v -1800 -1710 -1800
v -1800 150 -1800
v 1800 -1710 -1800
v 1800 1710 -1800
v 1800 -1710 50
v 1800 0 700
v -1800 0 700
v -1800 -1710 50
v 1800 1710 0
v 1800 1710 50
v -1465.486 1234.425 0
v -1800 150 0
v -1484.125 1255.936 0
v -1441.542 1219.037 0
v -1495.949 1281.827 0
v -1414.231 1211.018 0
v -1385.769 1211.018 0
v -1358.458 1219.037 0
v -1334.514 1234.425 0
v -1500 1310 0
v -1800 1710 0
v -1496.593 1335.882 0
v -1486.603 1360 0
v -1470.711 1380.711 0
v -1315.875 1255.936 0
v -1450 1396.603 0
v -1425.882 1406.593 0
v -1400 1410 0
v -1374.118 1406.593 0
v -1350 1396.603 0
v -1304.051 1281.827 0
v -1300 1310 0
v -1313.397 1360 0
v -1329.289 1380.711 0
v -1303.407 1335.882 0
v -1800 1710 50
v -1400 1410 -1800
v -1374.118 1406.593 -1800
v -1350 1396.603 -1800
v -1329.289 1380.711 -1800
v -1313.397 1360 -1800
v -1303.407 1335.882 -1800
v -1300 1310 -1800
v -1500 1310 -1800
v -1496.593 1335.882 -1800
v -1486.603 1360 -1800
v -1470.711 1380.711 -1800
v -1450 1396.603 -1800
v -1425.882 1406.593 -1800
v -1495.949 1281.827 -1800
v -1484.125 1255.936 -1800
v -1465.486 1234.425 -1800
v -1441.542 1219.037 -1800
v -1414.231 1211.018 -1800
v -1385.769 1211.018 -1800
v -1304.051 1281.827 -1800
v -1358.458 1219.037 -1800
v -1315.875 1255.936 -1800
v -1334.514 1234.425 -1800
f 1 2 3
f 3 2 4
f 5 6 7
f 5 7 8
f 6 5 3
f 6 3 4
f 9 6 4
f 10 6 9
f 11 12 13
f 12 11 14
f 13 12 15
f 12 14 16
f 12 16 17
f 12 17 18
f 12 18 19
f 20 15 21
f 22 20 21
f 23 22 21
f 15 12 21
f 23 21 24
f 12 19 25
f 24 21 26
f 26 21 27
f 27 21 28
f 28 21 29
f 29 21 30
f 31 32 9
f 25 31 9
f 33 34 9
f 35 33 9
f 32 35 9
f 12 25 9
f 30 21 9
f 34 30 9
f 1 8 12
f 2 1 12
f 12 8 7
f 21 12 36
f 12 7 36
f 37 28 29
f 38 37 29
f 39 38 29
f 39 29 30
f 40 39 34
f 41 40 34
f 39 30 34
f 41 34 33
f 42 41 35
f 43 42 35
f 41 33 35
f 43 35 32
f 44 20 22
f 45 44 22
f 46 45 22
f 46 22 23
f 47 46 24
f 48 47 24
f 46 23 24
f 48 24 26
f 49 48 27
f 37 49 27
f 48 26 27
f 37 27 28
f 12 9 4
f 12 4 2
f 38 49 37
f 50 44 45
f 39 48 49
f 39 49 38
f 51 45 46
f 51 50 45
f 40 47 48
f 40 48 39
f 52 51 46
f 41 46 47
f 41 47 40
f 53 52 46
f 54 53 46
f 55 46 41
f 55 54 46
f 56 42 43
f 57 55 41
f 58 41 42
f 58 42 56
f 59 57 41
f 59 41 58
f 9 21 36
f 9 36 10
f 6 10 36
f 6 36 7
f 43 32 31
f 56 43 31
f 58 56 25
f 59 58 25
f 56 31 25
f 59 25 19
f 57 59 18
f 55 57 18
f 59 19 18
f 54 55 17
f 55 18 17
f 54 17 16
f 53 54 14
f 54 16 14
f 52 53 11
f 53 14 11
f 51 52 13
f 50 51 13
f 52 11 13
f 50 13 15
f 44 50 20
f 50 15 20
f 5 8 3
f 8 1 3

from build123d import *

# Parameters (mm, degrees)
F1_DEPTH = 1800
F2_W     = 3600
F2_H     = 3420
F3_DEPTH = 50
F6_DEPTH = 3600
F8_DEPTH = 1800


with BuildPart() as f1:
    # F0 (on Top) → F1 (new body)
    with BuildSketch(Plane.XY):
        Polygon((-1800, 150), (-1800, -1710), (1800, -1710), (1800, 150), (1800, 1710), align=None)
    extrude(amount=-F1_DEPTH)

    # F2 (on face) → F3 (join)
    with BuildSketch(Plane.XY):
        Rectangle(F2_W, F2_H)
    extrude(amount=F3_DEPTH)

    # F5 (on face) → F6 (join)
    with BuildSketch(Plane.YZ.offset(1800)):
        Polygon((-1710, 50), (0, 50), (0, 700), align=None)
        Polygon((0, 700), (0, 50), (1710, 50), align=None)
    extrude(amount=-F6_DEPTH)

    # F7 (on face) → F8 (join)
    with BuildSketch(Plane(origin=(0, 0, 0), x_dir=(1, 0, 0), z_dir=(0, 0, -1))):
        with BuildLine():
            ThreePointArc((-1500, -1310), (-1470.710678, -1380.710678), (-1400, -1410))
            Line((-1400, -1410), (-1400, -1310))
            Line((-1400, -1310), (-1500, -1310))
        make_face()
        with BuildLine():
            Line((-1400, -1310), (-1400, -1410))
            ThreePointArc((-1400, -1410), (-1329.289322, -1380.710678), (-1300, -1310))
            ThreePointArc((-1300, -1310), (-1400, -1210), (-1500, -1310))
            Line((-1500, -1310), (-1400, -1310))
        make_face()
    extrude(amount=F8_DEPTH)


solid = f1.part
